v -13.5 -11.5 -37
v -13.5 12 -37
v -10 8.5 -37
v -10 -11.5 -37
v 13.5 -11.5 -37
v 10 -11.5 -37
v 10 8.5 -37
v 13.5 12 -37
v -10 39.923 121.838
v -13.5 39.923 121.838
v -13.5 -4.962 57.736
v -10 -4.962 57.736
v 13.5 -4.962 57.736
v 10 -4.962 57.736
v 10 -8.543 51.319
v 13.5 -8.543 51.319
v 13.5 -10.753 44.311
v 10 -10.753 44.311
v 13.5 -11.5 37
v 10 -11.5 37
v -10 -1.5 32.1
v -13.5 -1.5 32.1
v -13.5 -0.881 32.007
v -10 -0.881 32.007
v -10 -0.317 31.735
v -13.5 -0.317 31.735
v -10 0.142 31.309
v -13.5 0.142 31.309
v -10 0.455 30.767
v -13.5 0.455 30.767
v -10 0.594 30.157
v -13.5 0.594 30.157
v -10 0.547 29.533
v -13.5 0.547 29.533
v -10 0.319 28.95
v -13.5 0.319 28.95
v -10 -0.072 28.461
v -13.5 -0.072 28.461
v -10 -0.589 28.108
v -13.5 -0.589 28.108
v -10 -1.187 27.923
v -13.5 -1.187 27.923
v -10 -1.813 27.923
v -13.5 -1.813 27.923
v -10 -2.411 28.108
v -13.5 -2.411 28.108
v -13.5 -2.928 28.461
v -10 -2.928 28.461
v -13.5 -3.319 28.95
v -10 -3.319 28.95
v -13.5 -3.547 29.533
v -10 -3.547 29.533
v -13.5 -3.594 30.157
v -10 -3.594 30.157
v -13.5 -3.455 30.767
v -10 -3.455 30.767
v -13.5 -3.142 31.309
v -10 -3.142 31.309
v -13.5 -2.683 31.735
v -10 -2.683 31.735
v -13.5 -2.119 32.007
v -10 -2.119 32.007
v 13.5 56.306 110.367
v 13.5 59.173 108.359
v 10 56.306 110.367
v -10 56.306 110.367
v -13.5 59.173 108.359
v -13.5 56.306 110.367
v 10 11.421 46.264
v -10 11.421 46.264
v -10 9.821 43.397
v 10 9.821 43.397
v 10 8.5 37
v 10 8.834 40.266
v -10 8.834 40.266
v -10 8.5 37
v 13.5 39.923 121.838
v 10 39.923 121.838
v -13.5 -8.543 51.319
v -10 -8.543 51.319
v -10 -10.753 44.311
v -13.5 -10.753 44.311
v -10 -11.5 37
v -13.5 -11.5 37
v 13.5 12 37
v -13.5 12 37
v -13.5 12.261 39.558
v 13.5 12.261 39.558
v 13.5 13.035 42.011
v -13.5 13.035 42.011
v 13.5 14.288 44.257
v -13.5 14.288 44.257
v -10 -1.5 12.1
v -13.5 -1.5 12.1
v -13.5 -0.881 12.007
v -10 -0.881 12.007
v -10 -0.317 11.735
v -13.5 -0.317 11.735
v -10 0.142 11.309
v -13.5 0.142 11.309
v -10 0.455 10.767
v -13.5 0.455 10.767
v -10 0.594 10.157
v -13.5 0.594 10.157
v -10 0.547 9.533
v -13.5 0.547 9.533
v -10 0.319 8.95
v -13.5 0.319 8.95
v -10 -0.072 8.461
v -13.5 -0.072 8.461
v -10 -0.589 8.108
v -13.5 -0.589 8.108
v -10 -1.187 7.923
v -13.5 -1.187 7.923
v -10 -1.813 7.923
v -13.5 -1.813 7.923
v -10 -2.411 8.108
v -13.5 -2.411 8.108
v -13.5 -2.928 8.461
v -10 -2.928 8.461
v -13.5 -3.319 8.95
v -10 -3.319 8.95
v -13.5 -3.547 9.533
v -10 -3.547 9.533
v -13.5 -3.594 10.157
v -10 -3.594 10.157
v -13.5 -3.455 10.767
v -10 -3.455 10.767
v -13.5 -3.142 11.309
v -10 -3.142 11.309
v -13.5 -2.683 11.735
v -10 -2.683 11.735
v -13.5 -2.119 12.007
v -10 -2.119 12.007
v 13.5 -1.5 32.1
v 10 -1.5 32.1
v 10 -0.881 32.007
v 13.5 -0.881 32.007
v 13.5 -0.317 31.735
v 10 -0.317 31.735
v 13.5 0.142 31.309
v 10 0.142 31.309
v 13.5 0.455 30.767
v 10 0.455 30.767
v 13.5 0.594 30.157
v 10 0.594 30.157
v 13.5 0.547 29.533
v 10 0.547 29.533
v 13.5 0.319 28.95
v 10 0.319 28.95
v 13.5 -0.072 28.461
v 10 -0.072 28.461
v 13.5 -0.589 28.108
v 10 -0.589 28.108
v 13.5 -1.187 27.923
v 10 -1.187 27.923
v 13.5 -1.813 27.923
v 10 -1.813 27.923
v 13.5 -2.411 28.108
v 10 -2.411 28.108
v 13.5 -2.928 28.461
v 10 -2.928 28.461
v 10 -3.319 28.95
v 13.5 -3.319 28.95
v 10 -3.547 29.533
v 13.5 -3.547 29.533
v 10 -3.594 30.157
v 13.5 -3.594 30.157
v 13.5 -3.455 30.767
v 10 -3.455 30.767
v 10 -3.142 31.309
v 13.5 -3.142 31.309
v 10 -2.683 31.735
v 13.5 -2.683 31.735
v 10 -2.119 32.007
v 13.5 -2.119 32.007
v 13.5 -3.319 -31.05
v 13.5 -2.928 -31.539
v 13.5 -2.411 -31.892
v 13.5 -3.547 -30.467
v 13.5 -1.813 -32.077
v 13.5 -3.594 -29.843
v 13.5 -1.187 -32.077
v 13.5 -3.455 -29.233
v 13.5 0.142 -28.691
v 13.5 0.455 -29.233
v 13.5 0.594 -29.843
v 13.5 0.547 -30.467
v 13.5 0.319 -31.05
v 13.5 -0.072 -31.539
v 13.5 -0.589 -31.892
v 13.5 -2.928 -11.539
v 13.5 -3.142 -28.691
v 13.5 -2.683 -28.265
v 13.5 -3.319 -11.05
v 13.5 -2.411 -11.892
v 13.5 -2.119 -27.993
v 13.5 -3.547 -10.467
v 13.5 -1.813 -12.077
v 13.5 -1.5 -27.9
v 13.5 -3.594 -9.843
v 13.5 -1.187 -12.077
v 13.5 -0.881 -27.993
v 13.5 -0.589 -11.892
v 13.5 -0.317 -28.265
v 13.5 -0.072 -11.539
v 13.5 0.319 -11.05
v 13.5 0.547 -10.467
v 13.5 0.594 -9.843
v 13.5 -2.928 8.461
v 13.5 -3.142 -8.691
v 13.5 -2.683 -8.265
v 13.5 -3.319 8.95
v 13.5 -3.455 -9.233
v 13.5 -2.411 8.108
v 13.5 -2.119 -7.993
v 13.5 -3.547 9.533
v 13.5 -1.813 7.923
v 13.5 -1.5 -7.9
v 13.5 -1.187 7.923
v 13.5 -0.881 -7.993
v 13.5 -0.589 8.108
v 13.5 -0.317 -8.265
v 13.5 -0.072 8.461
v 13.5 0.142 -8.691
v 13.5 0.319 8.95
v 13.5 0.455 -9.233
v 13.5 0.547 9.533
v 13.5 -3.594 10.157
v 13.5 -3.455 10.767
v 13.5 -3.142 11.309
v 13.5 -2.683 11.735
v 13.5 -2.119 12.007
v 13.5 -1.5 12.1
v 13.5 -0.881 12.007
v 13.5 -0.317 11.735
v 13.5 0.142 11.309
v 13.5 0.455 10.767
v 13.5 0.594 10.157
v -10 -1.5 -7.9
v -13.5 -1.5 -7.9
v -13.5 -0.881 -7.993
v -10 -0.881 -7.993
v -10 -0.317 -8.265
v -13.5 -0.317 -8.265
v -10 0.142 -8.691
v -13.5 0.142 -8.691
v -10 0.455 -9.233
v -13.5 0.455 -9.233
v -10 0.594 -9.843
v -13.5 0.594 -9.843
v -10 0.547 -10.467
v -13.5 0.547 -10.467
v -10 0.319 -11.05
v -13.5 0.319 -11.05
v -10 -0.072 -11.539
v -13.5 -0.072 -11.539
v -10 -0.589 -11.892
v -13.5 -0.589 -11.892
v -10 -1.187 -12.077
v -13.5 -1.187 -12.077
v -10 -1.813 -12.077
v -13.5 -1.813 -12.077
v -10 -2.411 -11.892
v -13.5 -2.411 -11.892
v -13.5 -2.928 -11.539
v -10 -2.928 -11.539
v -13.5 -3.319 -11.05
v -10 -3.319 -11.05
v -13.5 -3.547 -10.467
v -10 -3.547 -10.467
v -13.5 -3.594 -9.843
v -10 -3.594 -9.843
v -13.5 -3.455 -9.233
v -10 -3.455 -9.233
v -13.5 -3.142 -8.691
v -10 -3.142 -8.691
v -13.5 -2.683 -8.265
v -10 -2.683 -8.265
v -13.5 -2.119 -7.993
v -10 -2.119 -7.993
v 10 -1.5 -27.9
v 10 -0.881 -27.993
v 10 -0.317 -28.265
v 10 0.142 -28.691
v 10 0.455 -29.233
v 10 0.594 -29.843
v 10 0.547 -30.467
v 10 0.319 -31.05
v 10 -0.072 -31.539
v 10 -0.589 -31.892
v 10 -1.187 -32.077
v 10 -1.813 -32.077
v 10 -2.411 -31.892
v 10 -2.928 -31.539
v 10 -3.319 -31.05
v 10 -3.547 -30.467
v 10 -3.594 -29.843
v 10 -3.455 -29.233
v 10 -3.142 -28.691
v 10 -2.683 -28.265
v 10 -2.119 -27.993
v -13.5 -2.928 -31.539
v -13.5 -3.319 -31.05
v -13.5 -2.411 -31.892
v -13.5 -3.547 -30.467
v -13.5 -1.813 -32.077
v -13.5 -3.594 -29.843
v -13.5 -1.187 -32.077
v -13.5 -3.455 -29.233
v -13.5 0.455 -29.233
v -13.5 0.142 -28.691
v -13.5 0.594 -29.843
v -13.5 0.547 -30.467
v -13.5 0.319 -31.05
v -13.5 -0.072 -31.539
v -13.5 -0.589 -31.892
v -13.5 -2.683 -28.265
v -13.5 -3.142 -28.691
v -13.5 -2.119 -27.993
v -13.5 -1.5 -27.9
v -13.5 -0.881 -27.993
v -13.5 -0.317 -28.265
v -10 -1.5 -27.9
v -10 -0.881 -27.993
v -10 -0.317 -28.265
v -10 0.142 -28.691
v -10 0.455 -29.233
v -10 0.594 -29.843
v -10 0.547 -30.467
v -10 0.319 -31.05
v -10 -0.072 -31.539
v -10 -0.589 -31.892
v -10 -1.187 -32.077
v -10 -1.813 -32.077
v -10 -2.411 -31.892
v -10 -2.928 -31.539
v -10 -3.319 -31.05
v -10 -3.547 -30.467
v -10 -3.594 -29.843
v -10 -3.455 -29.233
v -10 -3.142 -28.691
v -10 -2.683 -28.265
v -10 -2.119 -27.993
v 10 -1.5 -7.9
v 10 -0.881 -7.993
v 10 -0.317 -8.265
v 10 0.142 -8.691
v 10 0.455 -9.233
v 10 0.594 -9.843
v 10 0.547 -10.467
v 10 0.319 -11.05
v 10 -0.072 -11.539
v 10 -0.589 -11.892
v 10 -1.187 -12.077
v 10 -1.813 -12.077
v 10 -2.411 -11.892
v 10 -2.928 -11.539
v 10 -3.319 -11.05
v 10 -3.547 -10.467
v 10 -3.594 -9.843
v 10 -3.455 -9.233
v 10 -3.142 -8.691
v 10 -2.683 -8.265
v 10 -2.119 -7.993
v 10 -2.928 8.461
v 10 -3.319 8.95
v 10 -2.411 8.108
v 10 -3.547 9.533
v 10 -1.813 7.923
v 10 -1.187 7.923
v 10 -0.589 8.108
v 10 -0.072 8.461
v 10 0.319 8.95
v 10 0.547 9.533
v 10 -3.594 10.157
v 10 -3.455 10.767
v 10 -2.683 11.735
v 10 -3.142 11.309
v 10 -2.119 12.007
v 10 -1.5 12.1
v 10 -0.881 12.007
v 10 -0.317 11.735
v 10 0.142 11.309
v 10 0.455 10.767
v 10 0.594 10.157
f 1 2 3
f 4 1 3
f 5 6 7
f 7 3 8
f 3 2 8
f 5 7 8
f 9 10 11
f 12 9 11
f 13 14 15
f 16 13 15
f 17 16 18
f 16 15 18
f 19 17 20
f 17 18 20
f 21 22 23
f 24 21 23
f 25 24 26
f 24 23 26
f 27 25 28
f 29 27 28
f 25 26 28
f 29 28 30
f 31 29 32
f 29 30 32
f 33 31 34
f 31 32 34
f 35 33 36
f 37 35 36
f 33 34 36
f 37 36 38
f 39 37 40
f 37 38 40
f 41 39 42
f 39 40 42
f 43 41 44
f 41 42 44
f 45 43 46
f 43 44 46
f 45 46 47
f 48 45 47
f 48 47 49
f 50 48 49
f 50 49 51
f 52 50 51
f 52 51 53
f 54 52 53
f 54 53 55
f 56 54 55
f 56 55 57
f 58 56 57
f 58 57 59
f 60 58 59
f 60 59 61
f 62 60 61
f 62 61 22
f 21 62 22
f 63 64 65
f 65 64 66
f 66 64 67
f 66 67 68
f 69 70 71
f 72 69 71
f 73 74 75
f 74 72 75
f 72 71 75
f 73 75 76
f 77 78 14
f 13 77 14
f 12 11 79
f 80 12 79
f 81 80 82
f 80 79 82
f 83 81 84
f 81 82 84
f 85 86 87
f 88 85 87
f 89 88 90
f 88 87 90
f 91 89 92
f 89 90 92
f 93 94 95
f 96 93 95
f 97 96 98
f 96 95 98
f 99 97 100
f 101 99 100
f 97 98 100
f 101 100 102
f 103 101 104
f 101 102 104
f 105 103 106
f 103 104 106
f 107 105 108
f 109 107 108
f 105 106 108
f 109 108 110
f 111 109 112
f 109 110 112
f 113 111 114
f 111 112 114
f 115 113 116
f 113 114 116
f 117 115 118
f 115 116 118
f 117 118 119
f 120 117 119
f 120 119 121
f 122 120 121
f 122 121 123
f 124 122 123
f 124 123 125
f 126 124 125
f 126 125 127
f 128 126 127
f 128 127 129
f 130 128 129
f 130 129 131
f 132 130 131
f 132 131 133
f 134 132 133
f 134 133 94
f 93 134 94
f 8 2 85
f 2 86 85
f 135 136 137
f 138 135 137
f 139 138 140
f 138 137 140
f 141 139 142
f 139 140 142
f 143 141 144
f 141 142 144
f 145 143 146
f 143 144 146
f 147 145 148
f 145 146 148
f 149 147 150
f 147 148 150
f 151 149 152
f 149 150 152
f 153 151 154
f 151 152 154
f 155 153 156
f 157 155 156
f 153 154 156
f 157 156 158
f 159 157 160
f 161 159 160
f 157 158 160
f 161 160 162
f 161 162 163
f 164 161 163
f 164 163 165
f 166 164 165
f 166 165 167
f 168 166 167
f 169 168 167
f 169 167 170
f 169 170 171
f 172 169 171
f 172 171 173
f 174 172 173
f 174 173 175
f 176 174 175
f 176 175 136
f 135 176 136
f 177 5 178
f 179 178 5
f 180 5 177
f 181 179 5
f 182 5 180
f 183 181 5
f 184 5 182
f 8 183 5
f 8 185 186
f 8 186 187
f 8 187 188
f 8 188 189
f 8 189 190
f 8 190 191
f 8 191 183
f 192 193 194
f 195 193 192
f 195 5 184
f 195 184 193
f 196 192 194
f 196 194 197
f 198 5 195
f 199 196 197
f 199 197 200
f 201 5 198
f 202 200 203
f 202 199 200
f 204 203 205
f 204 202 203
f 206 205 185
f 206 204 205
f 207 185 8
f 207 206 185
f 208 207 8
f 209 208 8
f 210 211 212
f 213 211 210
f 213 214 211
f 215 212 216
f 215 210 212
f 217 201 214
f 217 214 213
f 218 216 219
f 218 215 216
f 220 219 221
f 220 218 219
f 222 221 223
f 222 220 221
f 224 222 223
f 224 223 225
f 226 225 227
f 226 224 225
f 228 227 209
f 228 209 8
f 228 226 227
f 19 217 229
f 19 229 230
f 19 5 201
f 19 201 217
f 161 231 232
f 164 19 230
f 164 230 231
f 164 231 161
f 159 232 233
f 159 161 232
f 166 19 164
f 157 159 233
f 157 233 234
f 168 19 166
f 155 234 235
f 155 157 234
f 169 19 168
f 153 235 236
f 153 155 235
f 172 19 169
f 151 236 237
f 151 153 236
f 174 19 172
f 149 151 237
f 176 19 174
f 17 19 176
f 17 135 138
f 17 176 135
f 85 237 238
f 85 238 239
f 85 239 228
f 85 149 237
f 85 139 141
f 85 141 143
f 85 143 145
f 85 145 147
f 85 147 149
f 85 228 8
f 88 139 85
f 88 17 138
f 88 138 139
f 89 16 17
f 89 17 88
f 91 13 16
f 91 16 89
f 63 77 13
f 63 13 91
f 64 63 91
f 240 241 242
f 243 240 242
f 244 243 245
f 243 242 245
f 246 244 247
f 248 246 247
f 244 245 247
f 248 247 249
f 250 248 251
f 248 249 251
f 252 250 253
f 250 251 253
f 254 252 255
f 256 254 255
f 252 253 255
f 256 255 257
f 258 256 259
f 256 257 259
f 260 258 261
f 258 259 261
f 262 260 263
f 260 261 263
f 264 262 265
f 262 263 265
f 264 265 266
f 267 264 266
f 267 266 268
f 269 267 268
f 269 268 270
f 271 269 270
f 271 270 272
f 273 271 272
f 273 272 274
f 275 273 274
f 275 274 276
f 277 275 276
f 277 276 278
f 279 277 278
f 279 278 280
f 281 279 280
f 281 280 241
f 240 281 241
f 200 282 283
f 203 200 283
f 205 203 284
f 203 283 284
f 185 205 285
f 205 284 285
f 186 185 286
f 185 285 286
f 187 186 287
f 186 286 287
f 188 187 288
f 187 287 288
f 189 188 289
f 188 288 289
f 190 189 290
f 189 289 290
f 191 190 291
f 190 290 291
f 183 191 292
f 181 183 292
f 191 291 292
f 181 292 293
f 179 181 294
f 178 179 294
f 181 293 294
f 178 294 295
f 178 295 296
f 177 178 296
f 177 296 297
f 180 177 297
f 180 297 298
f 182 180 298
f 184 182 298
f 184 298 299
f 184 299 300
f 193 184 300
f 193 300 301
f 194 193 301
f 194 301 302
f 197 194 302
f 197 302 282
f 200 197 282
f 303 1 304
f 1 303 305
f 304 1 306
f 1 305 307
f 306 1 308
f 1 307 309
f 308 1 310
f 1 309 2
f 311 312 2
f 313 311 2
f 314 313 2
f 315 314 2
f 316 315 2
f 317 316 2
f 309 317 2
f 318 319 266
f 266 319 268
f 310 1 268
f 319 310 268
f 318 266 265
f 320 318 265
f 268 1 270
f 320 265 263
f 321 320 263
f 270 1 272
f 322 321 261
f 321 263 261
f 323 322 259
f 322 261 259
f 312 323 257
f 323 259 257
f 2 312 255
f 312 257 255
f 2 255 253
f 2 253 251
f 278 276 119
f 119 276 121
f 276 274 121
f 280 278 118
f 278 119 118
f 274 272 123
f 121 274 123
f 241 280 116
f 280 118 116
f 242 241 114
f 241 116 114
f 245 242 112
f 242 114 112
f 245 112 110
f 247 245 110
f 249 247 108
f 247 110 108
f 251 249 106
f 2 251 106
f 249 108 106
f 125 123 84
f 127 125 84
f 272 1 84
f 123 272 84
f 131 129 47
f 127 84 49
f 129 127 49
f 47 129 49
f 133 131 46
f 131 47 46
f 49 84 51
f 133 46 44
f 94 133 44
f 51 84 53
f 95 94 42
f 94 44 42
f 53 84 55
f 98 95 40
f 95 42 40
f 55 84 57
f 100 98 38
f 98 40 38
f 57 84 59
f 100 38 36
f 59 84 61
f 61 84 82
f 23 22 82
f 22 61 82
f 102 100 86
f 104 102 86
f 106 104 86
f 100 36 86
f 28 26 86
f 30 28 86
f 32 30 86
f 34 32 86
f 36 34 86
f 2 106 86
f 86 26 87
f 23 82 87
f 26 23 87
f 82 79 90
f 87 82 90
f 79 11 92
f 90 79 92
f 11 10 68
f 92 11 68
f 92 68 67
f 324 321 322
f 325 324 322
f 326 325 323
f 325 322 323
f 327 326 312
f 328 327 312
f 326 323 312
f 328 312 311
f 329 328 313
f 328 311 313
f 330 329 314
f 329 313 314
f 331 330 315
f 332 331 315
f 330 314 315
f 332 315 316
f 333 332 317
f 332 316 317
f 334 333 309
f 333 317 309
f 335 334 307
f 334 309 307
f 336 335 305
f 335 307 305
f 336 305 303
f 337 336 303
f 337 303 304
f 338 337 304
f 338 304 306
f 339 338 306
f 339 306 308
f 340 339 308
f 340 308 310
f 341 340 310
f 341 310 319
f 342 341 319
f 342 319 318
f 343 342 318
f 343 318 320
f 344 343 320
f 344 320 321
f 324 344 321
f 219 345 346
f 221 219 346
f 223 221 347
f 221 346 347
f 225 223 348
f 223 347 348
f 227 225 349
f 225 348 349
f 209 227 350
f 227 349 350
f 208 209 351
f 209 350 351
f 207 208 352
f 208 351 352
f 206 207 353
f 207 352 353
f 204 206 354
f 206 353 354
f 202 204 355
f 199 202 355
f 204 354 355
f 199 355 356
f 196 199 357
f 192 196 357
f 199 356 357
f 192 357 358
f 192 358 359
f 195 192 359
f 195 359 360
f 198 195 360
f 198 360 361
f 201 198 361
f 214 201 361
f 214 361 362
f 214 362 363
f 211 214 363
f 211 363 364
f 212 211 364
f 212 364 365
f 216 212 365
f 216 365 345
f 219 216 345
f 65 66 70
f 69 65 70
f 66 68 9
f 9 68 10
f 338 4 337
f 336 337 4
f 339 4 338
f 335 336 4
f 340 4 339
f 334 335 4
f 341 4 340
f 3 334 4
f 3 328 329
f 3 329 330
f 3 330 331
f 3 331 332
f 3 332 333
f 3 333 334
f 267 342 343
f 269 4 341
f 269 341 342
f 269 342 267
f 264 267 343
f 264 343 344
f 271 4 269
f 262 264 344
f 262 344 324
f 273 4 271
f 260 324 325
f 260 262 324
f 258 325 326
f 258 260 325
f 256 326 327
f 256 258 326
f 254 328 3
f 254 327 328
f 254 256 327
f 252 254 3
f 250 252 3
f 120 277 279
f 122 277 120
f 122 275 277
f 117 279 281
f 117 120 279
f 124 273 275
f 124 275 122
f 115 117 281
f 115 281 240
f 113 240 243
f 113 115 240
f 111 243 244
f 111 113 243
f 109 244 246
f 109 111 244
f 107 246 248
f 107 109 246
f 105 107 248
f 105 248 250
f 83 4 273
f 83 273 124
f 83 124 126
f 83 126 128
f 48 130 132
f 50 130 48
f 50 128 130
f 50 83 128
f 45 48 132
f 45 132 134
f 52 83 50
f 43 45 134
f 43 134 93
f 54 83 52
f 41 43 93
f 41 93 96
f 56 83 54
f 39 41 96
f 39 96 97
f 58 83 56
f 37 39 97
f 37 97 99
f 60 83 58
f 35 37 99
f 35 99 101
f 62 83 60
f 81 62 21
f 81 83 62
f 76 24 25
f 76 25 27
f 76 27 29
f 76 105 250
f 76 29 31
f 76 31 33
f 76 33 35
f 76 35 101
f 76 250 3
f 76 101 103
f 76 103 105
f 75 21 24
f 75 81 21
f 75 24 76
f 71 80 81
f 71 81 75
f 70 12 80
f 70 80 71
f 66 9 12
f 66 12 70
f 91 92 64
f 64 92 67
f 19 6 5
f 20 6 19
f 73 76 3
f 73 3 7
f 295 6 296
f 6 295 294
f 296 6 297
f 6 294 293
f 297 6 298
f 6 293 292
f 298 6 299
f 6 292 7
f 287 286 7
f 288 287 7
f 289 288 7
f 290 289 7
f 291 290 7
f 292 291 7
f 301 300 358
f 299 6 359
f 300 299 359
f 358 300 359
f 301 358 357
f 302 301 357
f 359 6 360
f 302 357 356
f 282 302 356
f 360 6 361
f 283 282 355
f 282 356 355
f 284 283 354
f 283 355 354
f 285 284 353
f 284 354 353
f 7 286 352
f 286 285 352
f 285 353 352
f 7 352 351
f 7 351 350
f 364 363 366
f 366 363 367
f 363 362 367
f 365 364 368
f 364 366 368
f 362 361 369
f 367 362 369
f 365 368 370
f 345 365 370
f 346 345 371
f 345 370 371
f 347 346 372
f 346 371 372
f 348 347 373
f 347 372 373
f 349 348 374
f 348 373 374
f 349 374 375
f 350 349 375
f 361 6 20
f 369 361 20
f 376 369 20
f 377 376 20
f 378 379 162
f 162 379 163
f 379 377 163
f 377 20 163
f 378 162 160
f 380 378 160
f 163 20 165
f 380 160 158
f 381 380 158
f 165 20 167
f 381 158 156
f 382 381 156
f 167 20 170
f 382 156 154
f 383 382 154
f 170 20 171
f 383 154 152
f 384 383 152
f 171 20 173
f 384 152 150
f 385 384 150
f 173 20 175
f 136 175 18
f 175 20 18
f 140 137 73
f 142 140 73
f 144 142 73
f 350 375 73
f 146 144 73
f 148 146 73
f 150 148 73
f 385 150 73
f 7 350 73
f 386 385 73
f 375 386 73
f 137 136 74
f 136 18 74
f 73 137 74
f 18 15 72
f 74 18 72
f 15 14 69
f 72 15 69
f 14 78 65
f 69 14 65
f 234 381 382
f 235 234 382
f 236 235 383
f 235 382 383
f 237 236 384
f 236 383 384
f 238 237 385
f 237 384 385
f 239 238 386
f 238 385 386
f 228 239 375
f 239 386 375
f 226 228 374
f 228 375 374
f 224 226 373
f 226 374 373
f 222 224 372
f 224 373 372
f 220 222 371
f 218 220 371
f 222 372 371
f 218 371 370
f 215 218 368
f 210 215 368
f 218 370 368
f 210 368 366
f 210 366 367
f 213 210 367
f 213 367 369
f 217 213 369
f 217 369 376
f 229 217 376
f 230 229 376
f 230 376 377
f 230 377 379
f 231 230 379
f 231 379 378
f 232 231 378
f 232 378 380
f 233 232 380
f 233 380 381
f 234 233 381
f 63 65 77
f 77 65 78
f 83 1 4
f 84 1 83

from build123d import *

# Parameters (mm, degrees)
SKETCH1_W           = 27
SKETCH1_H           = 24
BOSS_EXTRUDE1_DEPTH = 37
SHELL1_T            = -3.5
SKETCH3_R           = 2.1
CUT_EXTRUDE1_DEPTH  = 48.349762407
SKETCH5_W           = 74
SKETCH5_H           = 0.5
CUT_EXTRUDE3_DEPTH  = 48.349762407
SWEEP1_START        = -13.5
SWEEP1_DEPTH        = 27
SWEEP1_2_DEPTH      = 3.5
SWEEP1_START_2      = 10
SWEEP1_3_DEPTH      = 3.5


# Read off the part's stored shape, not the designer's step: Sweep1
with BuildPart() as part:
    # Sketch1 → Boss-Extrude1 (new, symmetric)
    with BuildSketch(Plane.XY):
        Rectangle(SKETCH1_W, SKETCH1_H)
    extrude(amount=BOSS_EXTRUDE1_DEPTH, both=True)

    # Shell1
    shell1_openings = [part.faces().sort_by_distance(p)[0] for p in [
        (0, 0, 37),
        (0, 0, -37),
        (0, -12, 0),
    ]]
    offset(amount=SHELL1_T, openings=shell1_openings, kind=Kind.INTERSECTION)

    # Sketch3 → Cut-Extrude1 (cut, through all)
    with BuildSketch(Plane.ZY.offset(13.5)):
        with Locations((-30, -1.5)):
            Circle(SKETCH3_R)
        with Locations((-10, -1.5)):
            Circle(SKETCH3_R)
        with Locations((10, -1.5)):
            Circle(SKETCH3_R)
        with Locations((30, -1.5)):
            Circle(SKETCH3_R)
    extrude(amount=-CUT_EXTRUDE1_DEPTH, mode=Mode.SUBTRACT)

    # Sketch5 → Cut-Extrude3 (cut, through all)
    with BuildSketch(Plane.ZY.offset(13.5)):
        with Locations((0, -11.75)):
            Rectangle(SKETCH5_W, SKETCH5_H)
    extrude(amount=-CUT_EXTRUDE3_DEPTH, mode=Mode.SUBTRACT)

    # Sweep1 outline → Sweep1 (add)
    with BuildSketch(Plane.YZ.offset(SWEEP1_START)):
        with BuildLine():
            Line((14.288034431, 44.256718109), (59.173181861, 108.359351944))
            Line((59.173181861, 108.359351944), (56.306149706, 110.366869471))
            Line((56.306149706, 110.366869471), (11.421002276, 46.264235636))
            ThreePointArc((11.421002276, 46.264235636), (9.247550016, 41.856910443), (8.5, 37))
            Line((8.5, 37), (12, 37))
            ThreePointArc((12, 37), (12.585559344, 40.804440145), (14.288034431, 44.256718109))
        make_face()
    extrude(amount=SWEEP1_DEPTH)

    # Sweep1 2 outline → Sweep1 2 (add)
    with BuildSketch(Plane.YZ.offset(SWEEP1_START)):
        with BuildLine():
            Line((11.421002276, 46.264235636), (56.306149706, 110.366869471))
            Line((56.306149706, 110.366869471), (39.923108821, 121.838398198))
            Line((39.923108821, 121.838398198), (-4.96203861, 57.735764364))
            ThreePointArc((-4.96203861, 57.735764364), (-9.826788999, 47.871026434), (-11.5, 37))
            Line((-11.5, 37), (8.5, 37))
            ThreePointArc((8.5, 37), (9.247550016, 41.856910443), (11.421002276, 46.264235636))
        make_face()
    extrude(amount=SWEEP1_2_DEPTH)

    # Sweep1 3 outline → Sweep1 3 (add)
    with BuildSketch(Plane.YZ.offset(SWEEP1_START_2)):
        with BuildLine():
            Line((11.421002276, 46.264235636), (56.306149706, 110.366869471))
            Line((56.306149706, 110.366869471), (39.923108821, 121.838398198))
            Line((39.923108821, 121.838398198), (-4.96203861, 57.735764364))
            ThreePointArc((-4.96203861, 57.735764364), (-9.826788999, 47.871026434), (-11.5, 37))
            Line((-11.5, 37), (8.5, 37))
            ThreePointArc((8.5, 37), (9.247550016, 41.856910443), (11.421002276, 46.264235636))
        make_face()
    extrude(amount=SWEEP1_3_DEPTH)


solid = part.part
